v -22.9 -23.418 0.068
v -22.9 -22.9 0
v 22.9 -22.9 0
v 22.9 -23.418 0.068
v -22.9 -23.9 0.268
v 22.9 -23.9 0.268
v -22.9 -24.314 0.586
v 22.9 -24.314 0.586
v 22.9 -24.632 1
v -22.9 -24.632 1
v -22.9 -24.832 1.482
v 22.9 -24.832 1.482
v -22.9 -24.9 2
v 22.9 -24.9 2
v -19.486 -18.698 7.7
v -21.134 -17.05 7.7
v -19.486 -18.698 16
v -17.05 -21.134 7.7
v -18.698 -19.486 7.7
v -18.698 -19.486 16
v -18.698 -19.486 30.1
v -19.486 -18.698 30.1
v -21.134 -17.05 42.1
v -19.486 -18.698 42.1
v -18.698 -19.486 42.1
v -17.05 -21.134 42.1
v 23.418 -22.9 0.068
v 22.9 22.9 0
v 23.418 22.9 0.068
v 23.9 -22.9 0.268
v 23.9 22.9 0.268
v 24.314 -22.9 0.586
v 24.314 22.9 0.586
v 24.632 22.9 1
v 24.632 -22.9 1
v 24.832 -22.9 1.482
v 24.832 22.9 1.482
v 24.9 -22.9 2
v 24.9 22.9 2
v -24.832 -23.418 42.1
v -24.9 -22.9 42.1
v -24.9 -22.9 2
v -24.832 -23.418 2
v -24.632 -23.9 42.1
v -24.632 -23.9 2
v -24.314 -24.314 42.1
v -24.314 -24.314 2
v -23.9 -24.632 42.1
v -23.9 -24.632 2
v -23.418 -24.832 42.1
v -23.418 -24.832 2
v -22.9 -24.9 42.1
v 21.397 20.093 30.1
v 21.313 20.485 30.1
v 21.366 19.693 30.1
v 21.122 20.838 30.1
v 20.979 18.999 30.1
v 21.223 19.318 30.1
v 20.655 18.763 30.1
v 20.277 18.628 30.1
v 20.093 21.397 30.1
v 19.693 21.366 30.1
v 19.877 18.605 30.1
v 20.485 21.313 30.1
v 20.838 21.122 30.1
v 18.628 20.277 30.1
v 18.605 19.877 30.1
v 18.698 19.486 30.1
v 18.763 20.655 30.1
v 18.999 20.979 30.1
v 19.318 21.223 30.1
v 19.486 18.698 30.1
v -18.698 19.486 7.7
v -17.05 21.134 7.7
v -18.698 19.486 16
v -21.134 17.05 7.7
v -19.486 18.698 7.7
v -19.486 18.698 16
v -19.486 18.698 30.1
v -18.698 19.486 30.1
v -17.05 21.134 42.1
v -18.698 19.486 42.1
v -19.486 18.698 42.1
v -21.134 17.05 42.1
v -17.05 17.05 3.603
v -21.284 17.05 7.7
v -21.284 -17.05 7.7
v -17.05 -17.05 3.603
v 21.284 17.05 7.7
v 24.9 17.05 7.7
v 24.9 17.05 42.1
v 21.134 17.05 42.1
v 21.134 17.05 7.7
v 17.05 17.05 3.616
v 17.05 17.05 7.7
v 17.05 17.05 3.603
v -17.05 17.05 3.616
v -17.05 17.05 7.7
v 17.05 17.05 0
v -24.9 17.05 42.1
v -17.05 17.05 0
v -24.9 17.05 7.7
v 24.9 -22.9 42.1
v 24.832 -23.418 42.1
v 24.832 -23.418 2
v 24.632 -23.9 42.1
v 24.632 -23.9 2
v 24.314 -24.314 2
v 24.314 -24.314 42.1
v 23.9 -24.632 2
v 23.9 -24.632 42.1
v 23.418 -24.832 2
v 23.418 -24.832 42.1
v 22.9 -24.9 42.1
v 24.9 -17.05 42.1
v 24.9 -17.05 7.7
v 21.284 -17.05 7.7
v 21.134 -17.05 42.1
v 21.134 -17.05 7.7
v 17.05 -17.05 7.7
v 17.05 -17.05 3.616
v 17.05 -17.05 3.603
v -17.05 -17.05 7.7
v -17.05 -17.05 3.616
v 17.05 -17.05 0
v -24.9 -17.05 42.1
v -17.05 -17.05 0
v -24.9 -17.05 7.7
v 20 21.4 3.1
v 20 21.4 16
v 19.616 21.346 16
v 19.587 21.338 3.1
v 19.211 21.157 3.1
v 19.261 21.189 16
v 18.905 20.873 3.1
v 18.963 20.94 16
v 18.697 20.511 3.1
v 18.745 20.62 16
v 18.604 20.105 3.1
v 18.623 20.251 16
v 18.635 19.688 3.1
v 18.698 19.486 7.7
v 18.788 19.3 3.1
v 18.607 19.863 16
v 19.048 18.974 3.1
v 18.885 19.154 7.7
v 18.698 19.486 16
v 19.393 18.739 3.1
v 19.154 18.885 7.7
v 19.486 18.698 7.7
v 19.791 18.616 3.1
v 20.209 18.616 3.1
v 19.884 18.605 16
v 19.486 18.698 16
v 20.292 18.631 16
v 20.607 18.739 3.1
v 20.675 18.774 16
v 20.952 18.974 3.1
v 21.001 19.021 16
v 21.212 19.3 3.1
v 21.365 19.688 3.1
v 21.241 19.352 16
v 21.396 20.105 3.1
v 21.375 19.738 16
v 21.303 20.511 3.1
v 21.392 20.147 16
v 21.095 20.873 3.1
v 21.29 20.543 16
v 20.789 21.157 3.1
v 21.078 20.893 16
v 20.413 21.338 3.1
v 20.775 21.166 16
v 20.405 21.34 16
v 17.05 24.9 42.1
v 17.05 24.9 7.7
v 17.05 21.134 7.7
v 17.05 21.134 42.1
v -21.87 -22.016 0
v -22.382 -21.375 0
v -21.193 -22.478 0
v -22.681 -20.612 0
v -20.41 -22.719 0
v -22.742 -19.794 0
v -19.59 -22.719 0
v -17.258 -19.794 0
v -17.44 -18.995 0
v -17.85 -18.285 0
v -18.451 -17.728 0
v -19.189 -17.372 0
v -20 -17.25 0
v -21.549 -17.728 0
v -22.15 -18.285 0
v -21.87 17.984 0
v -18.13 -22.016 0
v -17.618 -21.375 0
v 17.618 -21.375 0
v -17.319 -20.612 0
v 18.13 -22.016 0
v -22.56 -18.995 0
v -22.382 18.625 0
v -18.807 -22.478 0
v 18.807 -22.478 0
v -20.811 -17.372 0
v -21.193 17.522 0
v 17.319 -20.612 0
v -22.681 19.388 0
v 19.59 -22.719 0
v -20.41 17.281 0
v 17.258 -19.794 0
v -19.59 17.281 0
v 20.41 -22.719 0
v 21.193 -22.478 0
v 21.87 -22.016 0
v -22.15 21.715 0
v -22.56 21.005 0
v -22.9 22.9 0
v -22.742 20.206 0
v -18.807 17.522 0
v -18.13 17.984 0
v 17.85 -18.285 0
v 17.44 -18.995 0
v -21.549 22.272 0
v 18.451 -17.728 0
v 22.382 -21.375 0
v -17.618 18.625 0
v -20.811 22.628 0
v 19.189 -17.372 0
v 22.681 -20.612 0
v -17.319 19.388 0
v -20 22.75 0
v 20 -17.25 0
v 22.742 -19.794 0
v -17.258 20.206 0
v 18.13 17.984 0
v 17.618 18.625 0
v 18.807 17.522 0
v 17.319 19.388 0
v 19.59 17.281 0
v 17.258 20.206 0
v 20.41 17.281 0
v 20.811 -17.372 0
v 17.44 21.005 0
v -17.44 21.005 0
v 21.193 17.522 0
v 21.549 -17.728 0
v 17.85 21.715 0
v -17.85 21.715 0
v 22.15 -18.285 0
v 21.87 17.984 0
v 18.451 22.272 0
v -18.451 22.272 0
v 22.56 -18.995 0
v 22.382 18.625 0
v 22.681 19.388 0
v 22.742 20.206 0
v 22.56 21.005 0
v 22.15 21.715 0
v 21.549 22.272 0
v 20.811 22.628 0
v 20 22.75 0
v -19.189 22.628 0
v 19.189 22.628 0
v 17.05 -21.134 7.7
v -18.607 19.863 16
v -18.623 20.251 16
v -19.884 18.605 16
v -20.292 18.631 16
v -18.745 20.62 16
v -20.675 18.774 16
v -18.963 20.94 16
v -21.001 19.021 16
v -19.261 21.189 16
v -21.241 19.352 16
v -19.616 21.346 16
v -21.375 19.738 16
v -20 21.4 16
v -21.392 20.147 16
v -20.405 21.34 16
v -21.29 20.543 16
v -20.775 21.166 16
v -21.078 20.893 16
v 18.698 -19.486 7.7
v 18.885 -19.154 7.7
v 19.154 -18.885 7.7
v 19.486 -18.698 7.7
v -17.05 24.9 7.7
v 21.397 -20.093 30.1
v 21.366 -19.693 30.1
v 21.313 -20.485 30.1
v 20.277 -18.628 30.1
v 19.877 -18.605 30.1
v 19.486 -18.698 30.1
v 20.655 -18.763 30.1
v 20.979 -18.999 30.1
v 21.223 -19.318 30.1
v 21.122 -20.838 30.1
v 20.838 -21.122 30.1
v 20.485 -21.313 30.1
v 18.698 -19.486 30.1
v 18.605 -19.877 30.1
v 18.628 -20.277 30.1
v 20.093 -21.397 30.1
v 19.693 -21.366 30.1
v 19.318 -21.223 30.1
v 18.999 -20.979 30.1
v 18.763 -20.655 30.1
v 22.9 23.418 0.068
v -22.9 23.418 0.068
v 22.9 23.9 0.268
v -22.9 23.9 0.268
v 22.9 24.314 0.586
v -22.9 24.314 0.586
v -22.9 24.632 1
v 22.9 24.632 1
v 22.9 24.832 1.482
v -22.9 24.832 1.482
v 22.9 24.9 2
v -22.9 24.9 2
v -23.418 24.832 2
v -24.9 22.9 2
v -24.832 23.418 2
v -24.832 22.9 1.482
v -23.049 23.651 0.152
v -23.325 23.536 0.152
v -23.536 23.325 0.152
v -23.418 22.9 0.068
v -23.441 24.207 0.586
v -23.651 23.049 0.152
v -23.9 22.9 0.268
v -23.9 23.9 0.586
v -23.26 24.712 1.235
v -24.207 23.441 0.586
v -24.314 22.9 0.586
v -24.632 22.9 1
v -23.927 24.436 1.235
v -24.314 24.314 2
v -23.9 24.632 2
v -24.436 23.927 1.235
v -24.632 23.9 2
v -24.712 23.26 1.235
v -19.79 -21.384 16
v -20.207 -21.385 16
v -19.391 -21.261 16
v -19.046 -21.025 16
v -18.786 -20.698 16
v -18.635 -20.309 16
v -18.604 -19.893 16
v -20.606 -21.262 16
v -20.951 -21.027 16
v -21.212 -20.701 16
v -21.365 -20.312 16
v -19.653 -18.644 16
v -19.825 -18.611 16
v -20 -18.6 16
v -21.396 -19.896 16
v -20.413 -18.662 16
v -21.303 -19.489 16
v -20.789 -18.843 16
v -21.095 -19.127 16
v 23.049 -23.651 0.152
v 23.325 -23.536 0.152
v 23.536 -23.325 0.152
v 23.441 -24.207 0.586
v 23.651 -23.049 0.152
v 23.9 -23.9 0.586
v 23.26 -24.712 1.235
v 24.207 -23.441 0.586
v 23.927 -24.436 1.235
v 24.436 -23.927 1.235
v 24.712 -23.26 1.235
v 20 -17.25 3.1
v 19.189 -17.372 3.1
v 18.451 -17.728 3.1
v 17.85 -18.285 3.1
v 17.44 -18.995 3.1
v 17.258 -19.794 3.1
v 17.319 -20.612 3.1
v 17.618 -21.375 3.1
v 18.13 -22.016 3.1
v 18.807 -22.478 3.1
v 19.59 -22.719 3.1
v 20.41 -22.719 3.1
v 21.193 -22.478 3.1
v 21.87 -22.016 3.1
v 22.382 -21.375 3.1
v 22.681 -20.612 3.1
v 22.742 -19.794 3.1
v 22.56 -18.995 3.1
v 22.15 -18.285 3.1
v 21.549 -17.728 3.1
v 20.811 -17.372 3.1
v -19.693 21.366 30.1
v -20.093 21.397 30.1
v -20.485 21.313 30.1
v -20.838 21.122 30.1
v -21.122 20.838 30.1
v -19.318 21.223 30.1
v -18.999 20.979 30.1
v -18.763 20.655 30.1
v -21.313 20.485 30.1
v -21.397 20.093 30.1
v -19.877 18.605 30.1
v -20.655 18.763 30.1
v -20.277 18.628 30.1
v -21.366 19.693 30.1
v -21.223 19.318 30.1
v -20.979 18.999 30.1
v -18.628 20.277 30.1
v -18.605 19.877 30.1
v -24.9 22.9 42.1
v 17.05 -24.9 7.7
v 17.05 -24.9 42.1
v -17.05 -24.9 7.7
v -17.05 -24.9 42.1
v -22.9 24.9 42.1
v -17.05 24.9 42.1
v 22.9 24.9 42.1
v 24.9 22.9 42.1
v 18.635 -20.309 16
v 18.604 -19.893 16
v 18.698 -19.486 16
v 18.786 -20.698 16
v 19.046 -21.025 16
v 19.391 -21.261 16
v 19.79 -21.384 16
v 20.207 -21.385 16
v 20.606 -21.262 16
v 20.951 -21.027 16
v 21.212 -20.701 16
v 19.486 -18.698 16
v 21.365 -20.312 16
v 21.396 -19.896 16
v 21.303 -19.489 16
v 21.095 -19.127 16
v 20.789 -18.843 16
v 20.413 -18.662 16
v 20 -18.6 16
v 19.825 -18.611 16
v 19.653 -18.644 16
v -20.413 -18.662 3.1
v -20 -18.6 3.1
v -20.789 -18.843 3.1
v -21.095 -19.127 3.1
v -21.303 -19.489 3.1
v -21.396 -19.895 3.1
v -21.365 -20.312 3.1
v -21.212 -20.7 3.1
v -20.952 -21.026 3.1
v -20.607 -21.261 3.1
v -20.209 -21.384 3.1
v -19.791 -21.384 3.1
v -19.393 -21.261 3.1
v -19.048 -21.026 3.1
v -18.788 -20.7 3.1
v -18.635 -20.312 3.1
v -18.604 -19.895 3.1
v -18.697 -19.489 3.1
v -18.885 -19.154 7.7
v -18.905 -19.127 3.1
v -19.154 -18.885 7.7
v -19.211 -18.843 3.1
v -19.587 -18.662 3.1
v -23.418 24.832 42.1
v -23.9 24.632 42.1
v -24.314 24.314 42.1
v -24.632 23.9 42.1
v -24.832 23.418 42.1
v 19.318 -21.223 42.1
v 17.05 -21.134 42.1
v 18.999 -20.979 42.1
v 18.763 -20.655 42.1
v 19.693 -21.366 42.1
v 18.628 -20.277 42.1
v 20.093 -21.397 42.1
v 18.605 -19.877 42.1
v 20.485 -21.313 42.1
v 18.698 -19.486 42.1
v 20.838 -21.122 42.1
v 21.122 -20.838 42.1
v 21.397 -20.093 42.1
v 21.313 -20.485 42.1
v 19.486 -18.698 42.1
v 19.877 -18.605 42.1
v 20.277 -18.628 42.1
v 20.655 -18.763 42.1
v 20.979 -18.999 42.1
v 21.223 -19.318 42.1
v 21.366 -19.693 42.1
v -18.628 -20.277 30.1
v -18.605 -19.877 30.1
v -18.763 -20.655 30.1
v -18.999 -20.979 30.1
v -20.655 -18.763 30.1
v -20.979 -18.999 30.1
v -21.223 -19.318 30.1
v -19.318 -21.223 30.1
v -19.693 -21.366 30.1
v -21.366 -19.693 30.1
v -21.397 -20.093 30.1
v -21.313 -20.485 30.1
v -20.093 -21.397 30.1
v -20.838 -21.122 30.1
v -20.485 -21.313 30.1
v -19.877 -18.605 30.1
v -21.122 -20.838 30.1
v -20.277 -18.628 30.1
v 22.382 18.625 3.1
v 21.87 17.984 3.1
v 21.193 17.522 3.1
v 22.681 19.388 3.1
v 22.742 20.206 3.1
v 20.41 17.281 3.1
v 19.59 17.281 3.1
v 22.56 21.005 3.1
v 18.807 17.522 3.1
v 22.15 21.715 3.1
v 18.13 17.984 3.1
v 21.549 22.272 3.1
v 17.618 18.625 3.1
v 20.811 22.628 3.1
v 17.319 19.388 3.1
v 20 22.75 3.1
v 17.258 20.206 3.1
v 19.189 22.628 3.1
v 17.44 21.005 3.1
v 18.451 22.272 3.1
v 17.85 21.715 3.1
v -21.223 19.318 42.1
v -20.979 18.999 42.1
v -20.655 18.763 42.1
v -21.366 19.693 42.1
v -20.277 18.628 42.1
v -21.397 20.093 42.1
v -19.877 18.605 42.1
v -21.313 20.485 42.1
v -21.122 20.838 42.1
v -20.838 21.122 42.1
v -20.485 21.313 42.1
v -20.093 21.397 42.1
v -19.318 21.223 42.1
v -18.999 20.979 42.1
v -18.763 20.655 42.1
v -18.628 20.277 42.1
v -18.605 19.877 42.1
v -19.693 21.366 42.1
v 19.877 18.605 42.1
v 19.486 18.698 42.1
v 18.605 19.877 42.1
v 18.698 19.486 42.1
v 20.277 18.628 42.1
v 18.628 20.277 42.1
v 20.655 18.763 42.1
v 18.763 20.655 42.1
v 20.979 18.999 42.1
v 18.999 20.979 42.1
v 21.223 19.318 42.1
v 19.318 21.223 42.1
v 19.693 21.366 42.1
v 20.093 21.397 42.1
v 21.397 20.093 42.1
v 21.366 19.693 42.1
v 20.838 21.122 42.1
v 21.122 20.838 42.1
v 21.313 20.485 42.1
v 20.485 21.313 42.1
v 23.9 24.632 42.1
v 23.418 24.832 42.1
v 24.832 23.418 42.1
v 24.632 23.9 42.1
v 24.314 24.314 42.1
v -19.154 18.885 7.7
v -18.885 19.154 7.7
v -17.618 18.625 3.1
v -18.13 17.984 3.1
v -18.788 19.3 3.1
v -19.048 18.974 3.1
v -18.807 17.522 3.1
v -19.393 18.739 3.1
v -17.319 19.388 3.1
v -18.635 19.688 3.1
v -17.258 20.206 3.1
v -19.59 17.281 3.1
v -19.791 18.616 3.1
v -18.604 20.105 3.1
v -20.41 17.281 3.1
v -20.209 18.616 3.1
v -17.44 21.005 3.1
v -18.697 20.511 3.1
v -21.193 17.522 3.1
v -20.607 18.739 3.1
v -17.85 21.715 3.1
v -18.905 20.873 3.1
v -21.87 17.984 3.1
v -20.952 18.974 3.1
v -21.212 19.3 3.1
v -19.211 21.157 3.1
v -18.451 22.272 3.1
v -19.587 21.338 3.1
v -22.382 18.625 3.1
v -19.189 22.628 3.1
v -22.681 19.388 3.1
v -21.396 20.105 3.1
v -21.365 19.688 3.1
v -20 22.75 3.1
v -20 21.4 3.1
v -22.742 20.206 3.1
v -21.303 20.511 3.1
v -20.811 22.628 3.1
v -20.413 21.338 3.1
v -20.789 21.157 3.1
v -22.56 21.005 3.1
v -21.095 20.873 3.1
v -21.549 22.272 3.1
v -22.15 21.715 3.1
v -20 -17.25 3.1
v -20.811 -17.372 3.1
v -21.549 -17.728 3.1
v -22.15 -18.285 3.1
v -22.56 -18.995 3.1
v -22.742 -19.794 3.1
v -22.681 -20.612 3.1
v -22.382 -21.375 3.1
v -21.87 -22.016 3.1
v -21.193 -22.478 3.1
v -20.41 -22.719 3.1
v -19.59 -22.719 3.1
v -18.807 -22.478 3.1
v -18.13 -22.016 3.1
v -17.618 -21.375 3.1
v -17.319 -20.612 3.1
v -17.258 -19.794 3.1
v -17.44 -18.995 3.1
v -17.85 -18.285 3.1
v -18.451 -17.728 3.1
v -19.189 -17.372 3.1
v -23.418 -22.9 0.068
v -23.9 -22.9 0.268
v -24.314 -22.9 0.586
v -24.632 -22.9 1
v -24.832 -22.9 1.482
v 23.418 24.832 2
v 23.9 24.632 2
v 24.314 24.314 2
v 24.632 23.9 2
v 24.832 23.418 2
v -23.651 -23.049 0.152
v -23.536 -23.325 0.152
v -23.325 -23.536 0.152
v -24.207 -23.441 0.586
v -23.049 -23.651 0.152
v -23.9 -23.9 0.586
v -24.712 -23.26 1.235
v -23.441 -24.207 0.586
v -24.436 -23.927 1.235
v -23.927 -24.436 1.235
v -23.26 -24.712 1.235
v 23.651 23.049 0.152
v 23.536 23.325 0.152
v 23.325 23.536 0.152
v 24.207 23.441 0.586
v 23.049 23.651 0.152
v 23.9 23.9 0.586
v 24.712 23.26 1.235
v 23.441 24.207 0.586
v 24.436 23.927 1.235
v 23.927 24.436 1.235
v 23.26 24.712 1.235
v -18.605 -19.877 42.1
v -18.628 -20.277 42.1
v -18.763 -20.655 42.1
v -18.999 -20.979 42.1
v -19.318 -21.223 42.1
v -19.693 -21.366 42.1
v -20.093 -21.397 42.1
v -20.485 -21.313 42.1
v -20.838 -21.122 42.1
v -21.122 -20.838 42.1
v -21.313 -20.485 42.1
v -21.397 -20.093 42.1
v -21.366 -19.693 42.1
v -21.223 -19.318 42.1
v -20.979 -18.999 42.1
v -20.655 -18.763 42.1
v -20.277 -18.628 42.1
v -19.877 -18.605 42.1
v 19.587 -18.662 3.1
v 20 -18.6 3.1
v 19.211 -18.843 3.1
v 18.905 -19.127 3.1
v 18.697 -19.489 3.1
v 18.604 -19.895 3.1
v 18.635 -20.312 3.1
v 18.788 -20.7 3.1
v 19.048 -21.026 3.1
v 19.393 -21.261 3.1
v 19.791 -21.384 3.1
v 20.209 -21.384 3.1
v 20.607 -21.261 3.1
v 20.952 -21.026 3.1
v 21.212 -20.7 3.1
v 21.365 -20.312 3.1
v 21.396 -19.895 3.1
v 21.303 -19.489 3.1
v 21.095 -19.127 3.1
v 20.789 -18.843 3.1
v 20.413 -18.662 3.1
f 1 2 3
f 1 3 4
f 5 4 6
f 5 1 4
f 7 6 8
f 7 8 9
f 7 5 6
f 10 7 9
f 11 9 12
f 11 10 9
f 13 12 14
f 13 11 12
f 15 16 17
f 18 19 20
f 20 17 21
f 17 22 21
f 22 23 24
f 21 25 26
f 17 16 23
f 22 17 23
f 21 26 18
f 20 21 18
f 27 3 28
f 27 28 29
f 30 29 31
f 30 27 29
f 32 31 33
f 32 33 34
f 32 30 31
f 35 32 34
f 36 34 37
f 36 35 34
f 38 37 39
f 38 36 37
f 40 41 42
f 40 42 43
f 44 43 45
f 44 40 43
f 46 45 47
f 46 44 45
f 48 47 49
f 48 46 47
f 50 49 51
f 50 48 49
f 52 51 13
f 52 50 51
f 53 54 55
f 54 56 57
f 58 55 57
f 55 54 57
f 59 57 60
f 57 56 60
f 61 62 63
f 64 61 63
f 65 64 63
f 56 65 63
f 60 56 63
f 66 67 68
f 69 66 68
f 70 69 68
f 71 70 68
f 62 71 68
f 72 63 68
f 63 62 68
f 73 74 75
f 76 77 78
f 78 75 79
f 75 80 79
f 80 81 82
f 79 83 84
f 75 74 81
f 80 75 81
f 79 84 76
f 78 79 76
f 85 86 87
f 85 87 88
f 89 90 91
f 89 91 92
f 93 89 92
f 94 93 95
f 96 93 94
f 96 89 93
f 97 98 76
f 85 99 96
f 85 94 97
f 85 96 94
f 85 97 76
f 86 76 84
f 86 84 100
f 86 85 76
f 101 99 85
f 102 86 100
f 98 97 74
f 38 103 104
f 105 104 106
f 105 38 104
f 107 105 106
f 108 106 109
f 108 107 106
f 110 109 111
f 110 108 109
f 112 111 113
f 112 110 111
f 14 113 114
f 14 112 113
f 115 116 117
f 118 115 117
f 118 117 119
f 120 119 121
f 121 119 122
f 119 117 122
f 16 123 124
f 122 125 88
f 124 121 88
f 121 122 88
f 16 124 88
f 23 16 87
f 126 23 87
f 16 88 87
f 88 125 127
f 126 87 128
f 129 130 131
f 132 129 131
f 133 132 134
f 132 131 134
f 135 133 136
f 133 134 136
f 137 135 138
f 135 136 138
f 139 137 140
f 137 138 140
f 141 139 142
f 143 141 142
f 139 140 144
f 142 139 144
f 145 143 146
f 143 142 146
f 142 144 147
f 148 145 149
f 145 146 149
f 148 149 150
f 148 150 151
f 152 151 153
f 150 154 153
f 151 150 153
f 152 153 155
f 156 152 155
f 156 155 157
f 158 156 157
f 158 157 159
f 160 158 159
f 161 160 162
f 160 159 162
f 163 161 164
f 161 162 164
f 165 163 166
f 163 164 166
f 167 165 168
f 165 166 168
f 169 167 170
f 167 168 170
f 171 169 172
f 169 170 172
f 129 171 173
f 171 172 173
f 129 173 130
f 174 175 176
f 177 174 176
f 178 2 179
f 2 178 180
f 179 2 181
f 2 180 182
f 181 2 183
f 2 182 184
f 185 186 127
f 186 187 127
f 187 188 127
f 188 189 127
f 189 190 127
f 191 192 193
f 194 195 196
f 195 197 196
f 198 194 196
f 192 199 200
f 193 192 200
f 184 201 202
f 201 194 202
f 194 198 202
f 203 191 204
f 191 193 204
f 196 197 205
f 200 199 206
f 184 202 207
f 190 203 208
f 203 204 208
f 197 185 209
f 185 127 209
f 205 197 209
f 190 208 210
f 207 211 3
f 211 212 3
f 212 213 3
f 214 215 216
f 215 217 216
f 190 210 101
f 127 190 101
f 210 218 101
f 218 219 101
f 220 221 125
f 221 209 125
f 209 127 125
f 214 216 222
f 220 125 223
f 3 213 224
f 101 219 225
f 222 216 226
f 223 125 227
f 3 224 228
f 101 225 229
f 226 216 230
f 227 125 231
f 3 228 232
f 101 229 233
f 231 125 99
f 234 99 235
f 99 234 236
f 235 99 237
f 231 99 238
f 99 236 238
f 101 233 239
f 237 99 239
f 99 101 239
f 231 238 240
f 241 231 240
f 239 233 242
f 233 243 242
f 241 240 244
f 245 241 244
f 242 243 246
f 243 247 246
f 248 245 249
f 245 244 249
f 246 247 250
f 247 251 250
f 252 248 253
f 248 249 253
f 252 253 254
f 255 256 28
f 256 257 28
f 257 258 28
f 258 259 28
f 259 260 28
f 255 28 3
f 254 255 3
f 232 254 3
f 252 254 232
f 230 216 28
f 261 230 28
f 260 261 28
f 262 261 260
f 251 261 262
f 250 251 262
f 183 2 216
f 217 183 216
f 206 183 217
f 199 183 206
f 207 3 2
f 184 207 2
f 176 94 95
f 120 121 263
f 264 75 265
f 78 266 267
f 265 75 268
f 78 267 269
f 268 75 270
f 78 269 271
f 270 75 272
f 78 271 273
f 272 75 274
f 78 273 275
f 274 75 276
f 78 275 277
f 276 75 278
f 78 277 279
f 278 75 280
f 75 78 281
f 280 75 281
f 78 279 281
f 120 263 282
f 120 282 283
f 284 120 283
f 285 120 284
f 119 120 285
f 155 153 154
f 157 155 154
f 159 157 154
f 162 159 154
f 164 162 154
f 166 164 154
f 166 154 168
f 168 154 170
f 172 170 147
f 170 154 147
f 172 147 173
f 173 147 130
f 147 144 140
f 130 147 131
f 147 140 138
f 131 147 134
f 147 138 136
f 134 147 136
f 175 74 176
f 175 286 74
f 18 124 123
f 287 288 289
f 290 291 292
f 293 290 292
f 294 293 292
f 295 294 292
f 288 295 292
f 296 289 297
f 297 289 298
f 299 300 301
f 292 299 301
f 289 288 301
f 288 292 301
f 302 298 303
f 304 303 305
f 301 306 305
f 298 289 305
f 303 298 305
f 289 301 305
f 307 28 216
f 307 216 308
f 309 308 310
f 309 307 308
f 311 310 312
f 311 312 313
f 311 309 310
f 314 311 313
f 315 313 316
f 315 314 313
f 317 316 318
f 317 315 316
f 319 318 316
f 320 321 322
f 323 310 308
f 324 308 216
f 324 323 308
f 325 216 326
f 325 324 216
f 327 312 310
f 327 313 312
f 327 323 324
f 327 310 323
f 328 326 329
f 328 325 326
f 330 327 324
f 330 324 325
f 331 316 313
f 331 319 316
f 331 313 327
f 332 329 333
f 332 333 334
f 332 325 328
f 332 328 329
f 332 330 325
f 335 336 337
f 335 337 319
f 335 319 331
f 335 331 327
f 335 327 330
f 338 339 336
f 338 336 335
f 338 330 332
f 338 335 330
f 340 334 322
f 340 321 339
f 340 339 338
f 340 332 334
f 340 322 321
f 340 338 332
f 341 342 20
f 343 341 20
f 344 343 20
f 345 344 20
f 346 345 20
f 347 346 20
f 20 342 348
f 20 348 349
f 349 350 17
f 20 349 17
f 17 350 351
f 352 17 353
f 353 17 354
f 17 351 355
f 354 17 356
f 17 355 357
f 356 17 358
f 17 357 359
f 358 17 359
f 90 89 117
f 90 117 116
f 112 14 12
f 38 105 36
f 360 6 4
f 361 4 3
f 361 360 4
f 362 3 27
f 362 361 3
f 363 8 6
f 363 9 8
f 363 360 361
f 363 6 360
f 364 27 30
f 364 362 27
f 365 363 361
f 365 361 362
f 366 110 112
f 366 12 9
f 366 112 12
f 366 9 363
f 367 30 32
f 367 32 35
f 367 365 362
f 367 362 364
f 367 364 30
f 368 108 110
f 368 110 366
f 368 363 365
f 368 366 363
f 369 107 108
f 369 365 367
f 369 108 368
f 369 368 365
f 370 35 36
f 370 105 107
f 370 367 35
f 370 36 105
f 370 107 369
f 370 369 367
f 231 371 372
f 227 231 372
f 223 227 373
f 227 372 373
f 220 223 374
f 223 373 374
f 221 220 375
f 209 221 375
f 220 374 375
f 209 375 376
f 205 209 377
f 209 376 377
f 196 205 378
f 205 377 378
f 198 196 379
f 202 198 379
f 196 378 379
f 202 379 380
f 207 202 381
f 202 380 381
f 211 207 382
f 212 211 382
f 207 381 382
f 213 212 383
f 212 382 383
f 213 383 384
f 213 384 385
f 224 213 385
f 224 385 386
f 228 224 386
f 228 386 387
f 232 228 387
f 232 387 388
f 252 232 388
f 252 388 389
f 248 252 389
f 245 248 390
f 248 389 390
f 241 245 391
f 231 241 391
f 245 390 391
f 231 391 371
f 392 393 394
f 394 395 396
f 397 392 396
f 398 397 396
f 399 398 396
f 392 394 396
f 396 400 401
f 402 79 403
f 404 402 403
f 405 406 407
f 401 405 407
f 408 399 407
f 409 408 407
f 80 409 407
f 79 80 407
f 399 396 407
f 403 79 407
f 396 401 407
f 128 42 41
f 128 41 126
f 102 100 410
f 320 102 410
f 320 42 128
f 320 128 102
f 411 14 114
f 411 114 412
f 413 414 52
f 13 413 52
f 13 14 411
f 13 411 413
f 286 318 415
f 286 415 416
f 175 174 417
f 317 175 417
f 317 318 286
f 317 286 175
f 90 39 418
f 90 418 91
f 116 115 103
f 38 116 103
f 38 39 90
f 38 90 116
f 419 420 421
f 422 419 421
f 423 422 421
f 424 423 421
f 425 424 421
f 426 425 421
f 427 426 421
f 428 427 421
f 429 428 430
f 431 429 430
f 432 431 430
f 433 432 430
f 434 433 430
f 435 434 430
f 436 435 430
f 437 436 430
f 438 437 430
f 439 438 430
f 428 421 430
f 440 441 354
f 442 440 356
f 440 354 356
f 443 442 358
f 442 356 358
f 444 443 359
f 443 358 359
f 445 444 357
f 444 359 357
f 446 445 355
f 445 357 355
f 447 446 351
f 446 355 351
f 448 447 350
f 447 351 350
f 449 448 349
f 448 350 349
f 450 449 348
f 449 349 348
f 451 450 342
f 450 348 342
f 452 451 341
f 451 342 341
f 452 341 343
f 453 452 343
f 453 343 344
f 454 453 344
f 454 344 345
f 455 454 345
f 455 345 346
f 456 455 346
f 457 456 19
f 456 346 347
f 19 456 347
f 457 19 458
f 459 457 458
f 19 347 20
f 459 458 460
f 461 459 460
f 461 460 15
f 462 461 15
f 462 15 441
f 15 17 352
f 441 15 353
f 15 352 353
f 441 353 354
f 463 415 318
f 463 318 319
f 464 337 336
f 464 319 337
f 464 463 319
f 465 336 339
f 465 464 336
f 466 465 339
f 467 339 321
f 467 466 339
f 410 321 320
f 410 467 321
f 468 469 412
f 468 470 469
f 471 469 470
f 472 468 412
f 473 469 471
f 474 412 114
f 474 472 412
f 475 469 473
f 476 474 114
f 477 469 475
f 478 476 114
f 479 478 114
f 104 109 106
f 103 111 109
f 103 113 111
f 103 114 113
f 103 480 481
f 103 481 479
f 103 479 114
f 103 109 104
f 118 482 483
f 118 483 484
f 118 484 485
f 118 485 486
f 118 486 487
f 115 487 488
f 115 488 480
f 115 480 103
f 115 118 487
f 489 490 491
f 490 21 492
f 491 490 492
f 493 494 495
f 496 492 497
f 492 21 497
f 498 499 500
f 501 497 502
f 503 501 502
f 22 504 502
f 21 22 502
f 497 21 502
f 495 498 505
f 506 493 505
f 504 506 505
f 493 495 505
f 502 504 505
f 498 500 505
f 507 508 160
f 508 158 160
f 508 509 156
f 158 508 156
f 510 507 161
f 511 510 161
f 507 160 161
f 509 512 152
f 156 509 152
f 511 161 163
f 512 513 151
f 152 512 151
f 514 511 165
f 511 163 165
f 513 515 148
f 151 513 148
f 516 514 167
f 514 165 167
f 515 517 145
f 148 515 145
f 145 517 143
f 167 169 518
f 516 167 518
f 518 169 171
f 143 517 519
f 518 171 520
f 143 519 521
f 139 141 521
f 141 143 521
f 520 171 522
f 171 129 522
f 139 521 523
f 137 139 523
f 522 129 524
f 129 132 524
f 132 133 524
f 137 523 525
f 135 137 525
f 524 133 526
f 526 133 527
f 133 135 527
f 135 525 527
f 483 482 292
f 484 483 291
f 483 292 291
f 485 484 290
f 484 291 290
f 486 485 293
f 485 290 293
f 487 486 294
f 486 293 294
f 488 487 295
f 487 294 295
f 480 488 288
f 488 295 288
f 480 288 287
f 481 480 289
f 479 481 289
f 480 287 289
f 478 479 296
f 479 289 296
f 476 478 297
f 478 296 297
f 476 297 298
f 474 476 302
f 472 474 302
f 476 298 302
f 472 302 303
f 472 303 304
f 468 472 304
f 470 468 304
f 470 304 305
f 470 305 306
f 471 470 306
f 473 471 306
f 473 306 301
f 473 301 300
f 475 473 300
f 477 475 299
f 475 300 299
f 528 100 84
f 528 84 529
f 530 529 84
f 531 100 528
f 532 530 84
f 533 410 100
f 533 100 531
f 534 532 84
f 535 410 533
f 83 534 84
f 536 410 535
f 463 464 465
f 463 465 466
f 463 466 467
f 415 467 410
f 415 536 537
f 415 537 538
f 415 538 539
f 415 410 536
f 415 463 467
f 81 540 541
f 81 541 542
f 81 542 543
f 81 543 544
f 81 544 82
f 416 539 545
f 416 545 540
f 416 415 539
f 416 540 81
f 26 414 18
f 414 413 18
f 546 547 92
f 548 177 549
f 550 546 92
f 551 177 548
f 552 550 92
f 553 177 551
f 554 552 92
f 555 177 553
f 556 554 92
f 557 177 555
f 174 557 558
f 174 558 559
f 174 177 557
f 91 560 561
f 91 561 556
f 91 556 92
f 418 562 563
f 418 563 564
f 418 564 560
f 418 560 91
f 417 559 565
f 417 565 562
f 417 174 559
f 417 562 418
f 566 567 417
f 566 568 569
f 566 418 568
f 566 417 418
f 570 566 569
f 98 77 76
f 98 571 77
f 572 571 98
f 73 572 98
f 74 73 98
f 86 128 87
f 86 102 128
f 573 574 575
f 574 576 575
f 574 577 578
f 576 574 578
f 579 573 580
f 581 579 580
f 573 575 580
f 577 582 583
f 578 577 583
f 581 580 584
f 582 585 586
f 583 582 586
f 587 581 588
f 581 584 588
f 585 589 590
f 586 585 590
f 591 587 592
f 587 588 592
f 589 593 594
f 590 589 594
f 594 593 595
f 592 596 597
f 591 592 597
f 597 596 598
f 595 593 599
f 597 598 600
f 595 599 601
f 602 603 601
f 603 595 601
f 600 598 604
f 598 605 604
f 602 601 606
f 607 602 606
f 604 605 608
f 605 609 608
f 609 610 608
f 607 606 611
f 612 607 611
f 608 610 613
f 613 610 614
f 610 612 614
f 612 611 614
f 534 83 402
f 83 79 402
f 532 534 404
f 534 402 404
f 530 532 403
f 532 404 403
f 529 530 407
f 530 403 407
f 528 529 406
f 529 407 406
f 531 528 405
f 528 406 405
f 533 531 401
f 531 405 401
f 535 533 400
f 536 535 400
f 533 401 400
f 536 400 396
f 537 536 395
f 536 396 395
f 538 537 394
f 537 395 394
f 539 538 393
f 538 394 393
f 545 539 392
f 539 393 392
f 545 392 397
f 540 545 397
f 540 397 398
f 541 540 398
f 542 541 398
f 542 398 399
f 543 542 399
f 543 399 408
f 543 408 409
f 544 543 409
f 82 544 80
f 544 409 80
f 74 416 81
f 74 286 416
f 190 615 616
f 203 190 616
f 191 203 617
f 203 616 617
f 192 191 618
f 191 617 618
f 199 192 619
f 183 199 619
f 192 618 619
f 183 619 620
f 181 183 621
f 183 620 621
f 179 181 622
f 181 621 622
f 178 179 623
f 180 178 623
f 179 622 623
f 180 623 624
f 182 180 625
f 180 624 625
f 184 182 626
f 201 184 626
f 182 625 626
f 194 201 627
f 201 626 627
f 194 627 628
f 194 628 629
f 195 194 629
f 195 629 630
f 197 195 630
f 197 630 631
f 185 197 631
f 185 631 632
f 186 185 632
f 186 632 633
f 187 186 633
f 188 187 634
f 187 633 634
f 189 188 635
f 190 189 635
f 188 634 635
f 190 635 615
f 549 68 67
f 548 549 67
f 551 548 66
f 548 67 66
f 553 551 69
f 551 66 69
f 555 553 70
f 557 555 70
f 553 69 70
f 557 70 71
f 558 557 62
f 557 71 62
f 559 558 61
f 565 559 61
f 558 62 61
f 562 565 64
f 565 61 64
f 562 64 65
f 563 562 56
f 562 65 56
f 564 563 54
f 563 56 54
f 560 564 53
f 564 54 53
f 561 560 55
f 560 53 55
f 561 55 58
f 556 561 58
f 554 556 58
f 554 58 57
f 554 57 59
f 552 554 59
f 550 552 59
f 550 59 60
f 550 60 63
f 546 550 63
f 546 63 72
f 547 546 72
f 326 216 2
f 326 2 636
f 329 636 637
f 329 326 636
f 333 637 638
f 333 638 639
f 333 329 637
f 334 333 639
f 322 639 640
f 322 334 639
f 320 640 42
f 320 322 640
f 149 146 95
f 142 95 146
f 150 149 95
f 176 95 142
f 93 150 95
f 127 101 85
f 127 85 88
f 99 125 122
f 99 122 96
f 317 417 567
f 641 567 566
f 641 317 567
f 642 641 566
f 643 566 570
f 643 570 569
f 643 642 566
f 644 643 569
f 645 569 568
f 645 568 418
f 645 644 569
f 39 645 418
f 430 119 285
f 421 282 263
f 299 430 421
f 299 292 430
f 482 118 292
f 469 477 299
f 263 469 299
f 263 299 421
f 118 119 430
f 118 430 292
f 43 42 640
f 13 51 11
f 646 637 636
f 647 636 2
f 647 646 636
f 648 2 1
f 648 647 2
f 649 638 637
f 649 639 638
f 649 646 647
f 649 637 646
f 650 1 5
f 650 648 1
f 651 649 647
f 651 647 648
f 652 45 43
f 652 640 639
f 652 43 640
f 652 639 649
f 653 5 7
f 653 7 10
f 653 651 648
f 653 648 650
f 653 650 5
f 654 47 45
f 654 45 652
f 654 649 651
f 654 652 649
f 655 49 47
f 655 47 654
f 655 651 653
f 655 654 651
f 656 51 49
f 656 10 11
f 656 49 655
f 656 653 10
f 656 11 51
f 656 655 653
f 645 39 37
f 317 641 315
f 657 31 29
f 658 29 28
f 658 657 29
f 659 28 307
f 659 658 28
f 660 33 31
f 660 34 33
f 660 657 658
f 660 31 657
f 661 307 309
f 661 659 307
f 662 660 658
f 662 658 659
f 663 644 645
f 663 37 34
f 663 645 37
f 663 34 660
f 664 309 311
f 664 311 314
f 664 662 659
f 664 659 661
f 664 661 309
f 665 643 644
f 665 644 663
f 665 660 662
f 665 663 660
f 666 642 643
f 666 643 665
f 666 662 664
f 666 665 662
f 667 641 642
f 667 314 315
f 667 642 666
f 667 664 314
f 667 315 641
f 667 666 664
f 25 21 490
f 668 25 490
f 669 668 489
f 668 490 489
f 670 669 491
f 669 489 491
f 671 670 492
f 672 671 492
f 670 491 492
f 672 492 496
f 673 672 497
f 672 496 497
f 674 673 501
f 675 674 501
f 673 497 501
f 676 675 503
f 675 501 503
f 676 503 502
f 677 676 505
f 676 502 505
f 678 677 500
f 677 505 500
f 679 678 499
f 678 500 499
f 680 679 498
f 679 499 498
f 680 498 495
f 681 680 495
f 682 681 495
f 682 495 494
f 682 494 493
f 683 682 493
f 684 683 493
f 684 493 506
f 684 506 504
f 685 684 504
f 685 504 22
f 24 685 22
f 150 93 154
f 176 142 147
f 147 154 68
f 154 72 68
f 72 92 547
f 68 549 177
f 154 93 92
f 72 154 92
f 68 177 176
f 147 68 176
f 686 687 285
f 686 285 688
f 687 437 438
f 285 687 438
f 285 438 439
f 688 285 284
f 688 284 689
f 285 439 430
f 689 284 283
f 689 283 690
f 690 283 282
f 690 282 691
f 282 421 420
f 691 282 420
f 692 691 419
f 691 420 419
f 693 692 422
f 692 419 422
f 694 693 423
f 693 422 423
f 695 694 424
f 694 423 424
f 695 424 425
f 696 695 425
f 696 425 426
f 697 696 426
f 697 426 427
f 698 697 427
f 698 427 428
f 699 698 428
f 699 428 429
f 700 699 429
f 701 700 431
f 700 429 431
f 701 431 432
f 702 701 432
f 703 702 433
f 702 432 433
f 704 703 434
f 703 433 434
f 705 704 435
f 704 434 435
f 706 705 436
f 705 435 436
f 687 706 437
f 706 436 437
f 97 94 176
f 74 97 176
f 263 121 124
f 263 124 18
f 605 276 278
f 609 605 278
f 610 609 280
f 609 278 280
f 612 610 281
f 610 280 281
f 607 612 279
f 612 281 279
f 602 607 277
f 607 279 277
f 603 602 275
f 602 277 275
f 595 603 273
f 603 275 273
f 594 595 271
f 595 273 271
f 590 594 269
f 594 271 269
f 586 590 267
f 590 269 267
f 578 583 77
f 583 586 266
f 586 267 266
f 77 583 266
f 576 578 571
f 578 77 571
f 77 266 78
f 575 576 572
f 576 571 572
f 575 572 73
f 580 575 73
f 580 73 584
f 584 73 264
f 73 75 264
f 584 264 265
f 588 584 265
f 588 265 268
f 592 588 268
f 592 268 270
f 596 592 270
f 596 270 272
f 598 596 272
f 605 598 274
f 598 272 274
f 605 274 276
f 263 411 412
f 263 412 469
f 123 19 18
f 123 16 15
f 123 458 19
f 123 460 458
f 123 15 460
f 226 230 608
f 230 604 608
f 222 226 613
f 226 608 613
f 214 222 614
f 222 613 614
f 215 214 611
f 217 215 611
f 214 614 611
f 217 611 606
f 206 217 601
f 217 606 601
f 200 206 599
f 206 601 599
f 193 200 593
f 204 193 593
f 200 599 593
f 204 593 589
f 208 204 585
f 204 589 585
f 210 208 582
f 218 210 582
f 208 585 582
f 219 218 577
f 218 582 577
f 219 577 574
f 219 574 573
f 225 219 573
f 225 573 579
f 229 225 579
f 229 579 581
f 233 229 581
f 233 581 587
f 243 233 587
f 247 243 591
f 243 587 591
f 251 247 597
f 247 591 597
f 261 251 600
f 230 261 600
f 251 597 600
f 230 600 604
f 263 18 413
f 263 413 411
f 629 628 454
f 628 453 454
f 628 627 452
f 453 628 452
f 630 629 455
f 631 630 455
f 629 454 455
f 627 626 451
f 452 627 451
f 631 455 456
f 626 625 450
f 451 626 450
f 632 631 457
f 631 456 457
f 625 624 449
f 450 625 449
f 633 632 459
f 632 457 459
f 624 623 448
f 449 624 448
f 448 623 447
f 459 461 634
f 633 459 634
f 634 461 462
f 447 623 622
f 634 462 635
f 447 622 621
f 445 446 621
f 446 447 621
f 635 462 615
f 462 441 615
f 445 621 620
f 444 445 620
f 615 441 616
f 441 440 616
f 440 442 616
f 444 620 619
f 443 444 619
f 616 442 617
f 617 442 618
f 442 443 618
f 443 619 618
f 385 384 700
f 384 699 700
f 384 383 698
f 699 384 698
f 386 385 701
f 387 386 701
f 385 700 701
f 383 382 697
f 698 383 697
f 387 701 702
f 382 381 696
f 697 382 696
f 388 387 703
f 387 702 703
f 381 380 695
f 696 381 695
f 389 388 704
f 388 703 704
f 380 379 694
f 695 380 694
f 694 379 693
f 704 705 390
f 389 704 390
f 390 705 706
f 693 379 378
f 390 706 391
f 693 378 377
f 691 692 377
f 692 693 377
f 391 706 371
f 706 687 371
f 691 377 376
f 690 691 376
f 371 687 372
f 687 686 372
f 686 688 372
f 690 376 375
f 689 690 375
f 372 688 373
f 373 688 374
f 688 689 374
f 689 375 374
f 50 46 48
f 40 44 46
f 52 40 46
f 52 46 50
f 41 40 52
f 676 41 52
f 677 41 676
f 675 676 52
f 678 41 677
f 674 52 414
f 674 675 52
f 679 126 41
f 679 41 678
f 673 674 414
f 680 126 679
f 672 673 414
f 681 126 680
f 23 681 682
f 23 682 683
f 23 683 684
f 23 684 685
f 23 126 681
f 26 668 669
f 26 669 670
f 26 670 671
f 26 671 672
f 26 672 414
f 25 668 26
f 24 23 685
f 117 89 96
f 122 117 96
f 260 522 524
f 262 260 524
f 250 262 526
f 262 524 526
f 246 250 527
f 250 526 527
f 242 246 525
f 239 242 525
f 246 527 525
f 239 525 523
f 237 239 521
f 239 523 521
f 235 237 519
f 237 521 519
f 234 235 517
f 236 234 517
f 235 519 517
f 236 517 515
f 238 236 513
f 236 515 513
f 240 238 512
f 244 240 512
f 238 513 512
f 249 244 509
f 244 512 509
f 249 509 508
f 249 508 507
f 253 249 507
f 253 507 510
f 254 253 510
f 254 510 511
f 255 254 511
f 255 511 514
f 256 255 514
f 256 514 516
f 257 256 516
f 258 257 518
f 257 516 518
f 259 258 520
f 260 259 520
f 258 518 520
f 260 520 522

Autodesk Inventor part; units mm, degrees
ref_plane "YZ Plane" through (0, 0, 0) normal (1, 0, 0) x (0, 1, 0)
ref_plane "XZ Plane" through (0, 0, 0) normal (0, 1, 0) x (-1, 0, 0)
ref_plane "XY Plane" through (0, 0, 0) normal (0, 0, 1) x (1, 0, 0)
sketch "Sketch1" plane through (0, 0, 0) normal (0, 0, 1) x (1, 0, 0)
  line L0 (-24.9, 24.9) -> (24.9, 24.9)
  line L1 (24.9, 24.9) -> (24.9, -24.9)
  line L2 (24.9, -24.9) -> (-24.9, -24.9)
  line L3 (-24.9, -24.9) -> (-24.9, 24.9)
  line L4 (-24.9, 24.9) -> (24.9, -24.9) construction
  line L5 (24.9, 24.9) -> (-24.9, -24.9) construction
  line L6 (17.05, 17.05) -> (-17.05, 17.05)
  line L7 (-17.05, 17.05) -> (-17.05, -17.05)
  line L8 (-17.05, -17.05) -> (17.05, -17.05)
  line L9 (17.05, -17.05) -> (17.05, 17.05)
  point P0 (0, 0)
  dimension "d0" = 49.8
  dimension "d1" = 49.8
  dimension "d2" = 7.85
extrude "Extrusion1" add sketch "Sketch1" along normal blind 7.7
sketch "Sketch2" plane through (0, 0, 7.7) normal (0, 0, 1) x (1, 0, 0)
  line L0 (17.05, 17.05) -> (17.05, -17.05) projected
  line L1 (17.05, -17.05) -> (-17.05, -17.05) projected
  line L2 (-17.05, -17.05) -> (-17.05, 17.05) projected
  line L3 (-17.05, 17.05) -> (17.05, 17.05) projected
  line L4 (24.9, 24.9) -> (-24.9, 24.9) projected
  line L5 (-24.9, 24.9) -> (-24.9, -24.9) projected
  line L6 (-24.9, -24.9) -> (24.9, -24.9) projected
  line L7 (24.9, -24.9) -> (24.9, 24.9) projected
  line L8 (17.05, -17.05) -> (24.9, -17.05)
  line L9 (24.9, -17.05) -> (24.9, -24.9)
  line L10 (24.9, -24.9) -> (17.05, -24.9)
  line L11 (17.05, -24.9) -> (17.05, -17.05)
  line L12 (17.05, 17.05) -> (-17.05, 17.05) projected
  line L13 (24.9, 24.9) -> (17.05, 24.9)
  line L14 (17.05, 24.9) -> (17.05, 17.05)
  line L15 (17.05, 17.05) -> (24.9, 17.05)
  line L16 (24.9, 17.05) -> (24.9, 24.9)
  line L17 (-24.9, -24.9) -> (-17.05, -24.9)
  line L18 (-17.05, -24.9) -> (-17.05, -17.05)
  line L19 (-17.05, -17.05) -> (-24.9, -17.05)
  line L20 (-24.9, -17.05) -> (-24.9, -24.9)
  line L21 (-24.9, 24.9) -> (-17.05, 24.9)
  line L22 (-17.05, 24.9) -> (-17.05, 17.05)
  line L23 (-17.05, 17.05) -> (-24.9, 17.05)
  line L24 (-24.9, 17.05) -> (-24.9, 24.9)
  point P0 (0, 0)
extrude "Extrusion2" add sketch "Sketch2" along normal blind 34.4 contours L14 L4 L7 L15 | L8 L7 L6 L11 | L23 L5 L4 L22 | L18 L6 L5 L19
sketch "Sketch3" plane through (0, 0, 0) normal (0, 0, -1) x (-1, 0, 0)
  line L0 (24.9, -24.9) -> (24.9, 24.9) construction
  line L1 (24.9, 24.9) -> (-24.9, 24.9) construction
  line L2 (-24.9, -24.9) -> (24.9, -24.9) construction
  line L3 (-24.9, 24.9) -> (-24.9, -24.9) construction
  point P0 (20, 20)
  point P1 (20, -20)
  point P2 (-20, -20)
  point P3 (-20, 20)
  dimension "d_1" = 4.9
  dimension "d96" = 4.9
  dimension "d97" = 4.9
  dimension "d98" = 4.9
  dimension "d99" = 4.9
  dimension "d100" = 4.9
  dimension "d101" = 4.9
  dimension "d102" = 4.9
hole "Hole1" at (-20, 20, 0) at (-20, -20, 0) at (20, -20, 0) at (20, 20, 0) direction (0, 0, 1) diameter 2.8 depth 16 counterbore diameter 5.5 counterbore depth 3.1
fillet "Fillet1" radius 2 8 edges at (24.9, 24.9, 21.05) (24.9, -24.9, 21.05) (-24.9, -24.9, 21.05) (-24.9, 24.9, 21.05) (-24.9, 0, 0) (0, -24.9, 0) (24.9, 0, 0) (0, 24.9, 0)
sketch "Sketch6" plane through (0, 0, 42.1) normal (0, 0, 1) x (1, 0, 0)
  arc A0 (-22.9, 24.9) -> (-24.9, 22.9) centre (-22.9, 22.9) ccw projected
  line L0 (-24.9, 22.9) -> (-24.9, 17.05) projected
  line L1 (-24.9, 17.05) -> (-17.05, 17.05) projected
  line L2 (-17.05, 17.05) -> (-17.05, 24.9) projected
  line L3 (-17.05, 24.9) -> (-22.9, 24.9) projected
  arc A1 (24.9, 22.9) -> (22.9, 24.9) centre (22.9, 22.9) ccw projected
  line L4 (22.9, 24.9) -> (17.05, 24.9) projected
  line L5 (17.05, 24.9) -> (17.05, 17.05) projected
  line L6 (17.05, 17.05) -> (24.9, 17.05) projected
  line L7 (24.9, 17.05) -> (24.9, 22.9) projected
  arc A2 (22.9, -24.9) -> (24.9, -22.9) centre (22.9, -22.9) ccw projected
  line L8 (24.9, -22.9) -> (24.9, -17.05) projected
  line L9 (24.9, -17.05) -> (17.05, -17.05) projected
  line L10 (17.05, -17.05) -> (17.05, -24.9) projected
  line L11 (17.05, -24.9) -> (22.9, -24.9) projected
  arc A3 (-24.9, -22.9) -> (-22.9, -24.9) centre (-22.9, -22.9) ccw projected
  line L12 (-22.9, -24.9) -> (-17.05, -24.9) projected
  line L13 (-17.05, -24.9) -> (-17.05, -17.05) projected
  line L14 (-17.05, -17.05) -> (-24.9, -17.05) projected
  line L15 (-24.9, -17.05) -> (-24.9, -22.9) projected
  line L16 (0, 38.1838) -> (54, 38.1838) construction
  line L17 (21.1338, 17.05) -> (17.05, 21.1338)
  line L18 (17.05, 24.9) -> (17.05, 17.05) projected
  line L19 (17.05, 21.1338) -> (17.05, 17.05)
  line L20 (17.05, 17.05) -> (21.1338, 17.05)
  line L21 (-17.05, 24.9) -> (-17.05, 17.05) projected
  line L22 (-17.05, 17.05) -> (-17.05, 21.1338)
  line L23 (-17.05, 21.1338) -> (-21.1338, 17.05)
  line L24 (-17.05, 21.1338) -> (-11.2747, 21.1338) construction
  line L25 (-17.05, -17.05) -> (-17.05, 17.05) projected
  line L26 (-21.1338, 17.05) -> (-17.05, 17.05)
  line L27 (-17.05, 17.05) -> (-21.1338, 17.05)
  line L28 (17.05, -17.05) -> (17.05, -24.9) projected
  line L29 (17.05, -17.05) -> (21.1338, -17.05)
  line L30 (24.9, -17.05) -> (17.05, -17.05) projected
  line L31 (21.1338, -17.05) -> (17.05, -21.1338)
  line L32 (17.05, -17.05) -> (17.05, -21.1338)
  line L33 (-17.05, -17.05) -> (-21.1338, -17.05)
  line L34 (-17.05, -17.05) -> (-17.05, -24.9) projected
  line L35 (-17.05, -17.05) -> (-17.05, -21.1338)
  line L36 (-21.1338, -17.05) -> (-17.05, -21.1338)
  line L37 (22.9, 22.9) -> (24.9, 22.9) construction
  line L38 (-22.9, -22.9) -> (22.9, 22.9) construction
  line L39 (-22.9, -22.9) -> (22.9, -22.9) construction
  line L40 (22.9, 22.9) -> (-22.9, 22.9) construction
  line L41 (22.9, -22.9) -> (-22.9, 22.9) construction
  dimension "d111" = 0
  dimension "d120" = 54
  dimension "d121" = 54
extrude "Extrusion3" cut sketch "Sketch6" against normal up to surface (34.4 mm away) contours L13 L36 L14 | L2 L1 L23 | L6 L5 L17 | L10 L9 L31
sketch "Sketch7" plane through (-24.9, 17.05, 7.7) normal (0, -1, 0) x (1, 0, 0)
  line L0 (41.95, 0) -> (49.95, 0) construction
  line L1 (41.95, -7.7) -> (41.95, 0) construction
  line L2 (7.85, -7.7) -> (7.85, 0) construction
  line L3 (-0.15, 0) -> (7.85, 0) construction
  line L4 (41.9235, 33.7204) -> (41.95, 0) construction
  line L5 (7.85, 0) -> (7.8764, 33.5861) construction
  line L6 (41.95, 0) -> (7.85, 0) construction
  circle A0 centre (24.9, 17.0366) radius 17.0366 construction
  line L7 (24.9, 55.2203) -> (-13.2838, 17.0366) construction
  line L8 (-13.2838, 17.0366) -> (24.9, -21.1472) construction
  line L9 (24.9, -21.1472) -> (63.0838, 17.0366) construction
  line L10 (63.0838, 17.0366) -> (24.9, 55.2203) construction
  line L11 (24.9, 55.2203) -> (24.9, -21.1472) construction
  line L12 (-13.2838, 17.0366) -> (63.0838, 17.0366) construction
  line L13 (24.9, 55.2203) -> (78.9, 55.2203) construction
  line L14 (46.1838, 0) -> (41.95, 0)
  line L15 (46.1838, 0) -> (41.95, -4.0972)
  line L16 (41.95, 0) -> (41.9235, 33.7204)
  line L17 (41.95, 0) -> (41.95, -4.0972)
  line L18 (46.1838, 0) -> (41.95, 0)
  line L19 (41.95, 0) -> (46.1838, 0)
  line L20 (7.85, 0) -> (3.6162, 0)
  line L21 (3.6162, 0) -> (7.85, -4.0972)
  line L22 (7.85, -4.0972) -> (7.85, 0)
  line L23 (24.9, -36.4773) -> (24.9, 70.8333) projected
  point P0 (44.386, 0)
  point P1 (43.5978, 0)
  point P2 (24.9, 17.0366)
  dimension "d37" = 54
  dimension "d38" = 135
  dimension "d39" = 54
extrude "Extrusion4" cut sketch "Sketch7" along normal up to surface (34.1 mm away)
sketch "Sketch8" plane through (17.05, -24.9, 7.7) normal (-1, 0, 0) x (0, 0, 1)
  line L0 (-4.0838, 41.95) -> (0, 41.95) construction
  line L1 (-4.0838, 7.85) -> (0.1503, 7.85) construction
  line L2 (0.1503, 7.85) -> (0.1503, 3.6159) construction
  line L3 (-4.0838, 7.85) -> (0.1503, 3.6159)
  line L4 (0.1503, 3.6159) -> (0.1503, 7.85)
  line L5 (0.1503, 7.85) -> (-4.0838, 7.85)
  line L6 (-4.0838, 41.95) -> (0, 46.0338)
  line L7 (-4.0838, 41.95) -> (1.6916, 41.95) construction
  line L8 (0.1503, 7.85) -> (0, 41.95)
  line L9 (0, 46.0338) -> (0, 41.95)
  line L10 (0, 41.95) -> (-4.0838, 41.95)
  line L11 (-6, 2) -> (-6, 47.8)
  line L12 (55.2338, 24.9) -> (17.05, 63.0838) construction
  line L13 (17.05, 63.0838) -> (-21.1338, 24.9) construction
  line L14 (-21.1338, 24.9) -> (17.05, -13.2838) construction
  line L15 (17.05, -13.2838) -> (55.2338, 24.9) construction
  line L16 (55.2338, 24.9) -> (-21.1338, 24.9) construction
  line L17 (17.05, 63.0838) -> (17.05, -13.2838) construction
  line L18 (-36.2573, 24.9) -> (70.6573, 24.9) construction
  line L19 (17.05, -28.5573) -> (17.05, 78.3573) construction
  line L20 (0, 41.95) -> (0, 43.5978) construction
  line L21 (0, 7.85) -> (-4.0972, 7.85) construction
  line L22 (-4.0972, 41.95) -> (-4.0972, 7.85) construction
  line L23 (0, 41.95) -> (-4.0972, 41.95) construction
  line L24 (0, 7.85) -> (0, 41.95) construction
  point P0 (-2.4341, 8)
  point P1 (0, 5.414)
  point P2 (17.05, 24.9)
  point P3 (17.05, 24.9)
  point P4 (17.05, 24.9)
  dimension "d122" = 54
  dimension "d123" = 54
extrude "Extrusion5" cut sketch "Sketch8" along normal up to surface (34.1 mm away)
sketch "Sketch9" plane through (0, 0, 42.1) normal (0, 0, 1) x (1, 0, 0)
  arc A0 (19.486, 18.6978) -> (18.6978, 19.486) centre (20, 20) ccw projected
  arc A1 (18.6978, -19.486) -> (19.486, -18.6978) centre (20, -20) ccw projected
  arc A2 (-19.486, -18.6978) -> (-18.6978, -19.486) centre (-20, -20) ccw projected
  arc A3 (-18.6978, 19.486) -> (-19.486, 18.6978) centre (-20, 20) ccw projected
hole "Hole2" at (20, 20, 42.1) at (-20, 20, 42.1) at (20, -20, 42.1) at (-20, -20, 42.1) direction (0, 0, -1) diameter 2.8 depth 12
sketch "Sketch15" plane through (0, 0, 0) normal (0, 0, -1) x (-1, 0, 0)
  line L0 (-17.05, -17.05) -> (-17.05, 17.05) construction
  line L1 (-17.05, 17.05) -> (17.05, 17.05) construction
  line L2 (17.05, 17.05) -> (17.05, -17.05) construction
  line L3 (17.05, -17.05) -> (-17.05, -17.05) construction
  circle A0 centre (-20, 20) radius 2.75 construction
  circle A1 centre (20, -20) radius 2.75 construction
  circle A2 centre (20, 20) radius 2.75 construction
  circle A3 centre (-20, -20) radius 2.75 construction
  line L4 (-22.9, 22.9) -> (22.9, 22.9) construction
  line L5 (-22.9, -22.9) -> (-22.9, 22.9) construction
  line L6 (22.9, -22.9) -> (-22.9, -22.9) construction
  line L7 (22.9, 22.9) -> (22.9, -22.9) construction
  line L8 (17.05, 21.1338) -> (-17.05, 21.1338) construction
  point P0 (0, 0)
  point P1 (-20.8, -14.5)
  point P2 (-14.5, -20.8)
  point P3 (14.5, -20.8)
  point P4 (20.8, -14.5)
  point P5 (20.8, 14.5)
  point P6 (14.5, 20.8)
  point P7 (-14.5, 20.8)
  point P8 (-20.8, 14.5)
hole "Hole8" [suppressed]
ref_plane "Arbeitsebene2" through (24.9, 0, 0) normal (-0.7071, 0, -0.7071) x (0, 1, 0)
ref_plane "Arbeitsebene3" through (0, -17.05, 7.7) normal (1, 0, 0) x (0, 0, -1)
ref_plane "Work Plane4" through (-17.05, 0, 7.7) normal (0, 1, 0) x (1, 0, 0)
equation "\"d1\" = d0"
equation "\"d96\" = d_1"
equation "\"d97\" = d_1"
equation "\"d98\" = d_1"
equation "\"d99\" = d_1"
equation "\"d100\" = d_1"
equation "\"d101\" = d_1"
equation "\"d102\" = d_1"
equation "\"d121\" = d120"
properties part number "10_Cube_1x1_v3"
